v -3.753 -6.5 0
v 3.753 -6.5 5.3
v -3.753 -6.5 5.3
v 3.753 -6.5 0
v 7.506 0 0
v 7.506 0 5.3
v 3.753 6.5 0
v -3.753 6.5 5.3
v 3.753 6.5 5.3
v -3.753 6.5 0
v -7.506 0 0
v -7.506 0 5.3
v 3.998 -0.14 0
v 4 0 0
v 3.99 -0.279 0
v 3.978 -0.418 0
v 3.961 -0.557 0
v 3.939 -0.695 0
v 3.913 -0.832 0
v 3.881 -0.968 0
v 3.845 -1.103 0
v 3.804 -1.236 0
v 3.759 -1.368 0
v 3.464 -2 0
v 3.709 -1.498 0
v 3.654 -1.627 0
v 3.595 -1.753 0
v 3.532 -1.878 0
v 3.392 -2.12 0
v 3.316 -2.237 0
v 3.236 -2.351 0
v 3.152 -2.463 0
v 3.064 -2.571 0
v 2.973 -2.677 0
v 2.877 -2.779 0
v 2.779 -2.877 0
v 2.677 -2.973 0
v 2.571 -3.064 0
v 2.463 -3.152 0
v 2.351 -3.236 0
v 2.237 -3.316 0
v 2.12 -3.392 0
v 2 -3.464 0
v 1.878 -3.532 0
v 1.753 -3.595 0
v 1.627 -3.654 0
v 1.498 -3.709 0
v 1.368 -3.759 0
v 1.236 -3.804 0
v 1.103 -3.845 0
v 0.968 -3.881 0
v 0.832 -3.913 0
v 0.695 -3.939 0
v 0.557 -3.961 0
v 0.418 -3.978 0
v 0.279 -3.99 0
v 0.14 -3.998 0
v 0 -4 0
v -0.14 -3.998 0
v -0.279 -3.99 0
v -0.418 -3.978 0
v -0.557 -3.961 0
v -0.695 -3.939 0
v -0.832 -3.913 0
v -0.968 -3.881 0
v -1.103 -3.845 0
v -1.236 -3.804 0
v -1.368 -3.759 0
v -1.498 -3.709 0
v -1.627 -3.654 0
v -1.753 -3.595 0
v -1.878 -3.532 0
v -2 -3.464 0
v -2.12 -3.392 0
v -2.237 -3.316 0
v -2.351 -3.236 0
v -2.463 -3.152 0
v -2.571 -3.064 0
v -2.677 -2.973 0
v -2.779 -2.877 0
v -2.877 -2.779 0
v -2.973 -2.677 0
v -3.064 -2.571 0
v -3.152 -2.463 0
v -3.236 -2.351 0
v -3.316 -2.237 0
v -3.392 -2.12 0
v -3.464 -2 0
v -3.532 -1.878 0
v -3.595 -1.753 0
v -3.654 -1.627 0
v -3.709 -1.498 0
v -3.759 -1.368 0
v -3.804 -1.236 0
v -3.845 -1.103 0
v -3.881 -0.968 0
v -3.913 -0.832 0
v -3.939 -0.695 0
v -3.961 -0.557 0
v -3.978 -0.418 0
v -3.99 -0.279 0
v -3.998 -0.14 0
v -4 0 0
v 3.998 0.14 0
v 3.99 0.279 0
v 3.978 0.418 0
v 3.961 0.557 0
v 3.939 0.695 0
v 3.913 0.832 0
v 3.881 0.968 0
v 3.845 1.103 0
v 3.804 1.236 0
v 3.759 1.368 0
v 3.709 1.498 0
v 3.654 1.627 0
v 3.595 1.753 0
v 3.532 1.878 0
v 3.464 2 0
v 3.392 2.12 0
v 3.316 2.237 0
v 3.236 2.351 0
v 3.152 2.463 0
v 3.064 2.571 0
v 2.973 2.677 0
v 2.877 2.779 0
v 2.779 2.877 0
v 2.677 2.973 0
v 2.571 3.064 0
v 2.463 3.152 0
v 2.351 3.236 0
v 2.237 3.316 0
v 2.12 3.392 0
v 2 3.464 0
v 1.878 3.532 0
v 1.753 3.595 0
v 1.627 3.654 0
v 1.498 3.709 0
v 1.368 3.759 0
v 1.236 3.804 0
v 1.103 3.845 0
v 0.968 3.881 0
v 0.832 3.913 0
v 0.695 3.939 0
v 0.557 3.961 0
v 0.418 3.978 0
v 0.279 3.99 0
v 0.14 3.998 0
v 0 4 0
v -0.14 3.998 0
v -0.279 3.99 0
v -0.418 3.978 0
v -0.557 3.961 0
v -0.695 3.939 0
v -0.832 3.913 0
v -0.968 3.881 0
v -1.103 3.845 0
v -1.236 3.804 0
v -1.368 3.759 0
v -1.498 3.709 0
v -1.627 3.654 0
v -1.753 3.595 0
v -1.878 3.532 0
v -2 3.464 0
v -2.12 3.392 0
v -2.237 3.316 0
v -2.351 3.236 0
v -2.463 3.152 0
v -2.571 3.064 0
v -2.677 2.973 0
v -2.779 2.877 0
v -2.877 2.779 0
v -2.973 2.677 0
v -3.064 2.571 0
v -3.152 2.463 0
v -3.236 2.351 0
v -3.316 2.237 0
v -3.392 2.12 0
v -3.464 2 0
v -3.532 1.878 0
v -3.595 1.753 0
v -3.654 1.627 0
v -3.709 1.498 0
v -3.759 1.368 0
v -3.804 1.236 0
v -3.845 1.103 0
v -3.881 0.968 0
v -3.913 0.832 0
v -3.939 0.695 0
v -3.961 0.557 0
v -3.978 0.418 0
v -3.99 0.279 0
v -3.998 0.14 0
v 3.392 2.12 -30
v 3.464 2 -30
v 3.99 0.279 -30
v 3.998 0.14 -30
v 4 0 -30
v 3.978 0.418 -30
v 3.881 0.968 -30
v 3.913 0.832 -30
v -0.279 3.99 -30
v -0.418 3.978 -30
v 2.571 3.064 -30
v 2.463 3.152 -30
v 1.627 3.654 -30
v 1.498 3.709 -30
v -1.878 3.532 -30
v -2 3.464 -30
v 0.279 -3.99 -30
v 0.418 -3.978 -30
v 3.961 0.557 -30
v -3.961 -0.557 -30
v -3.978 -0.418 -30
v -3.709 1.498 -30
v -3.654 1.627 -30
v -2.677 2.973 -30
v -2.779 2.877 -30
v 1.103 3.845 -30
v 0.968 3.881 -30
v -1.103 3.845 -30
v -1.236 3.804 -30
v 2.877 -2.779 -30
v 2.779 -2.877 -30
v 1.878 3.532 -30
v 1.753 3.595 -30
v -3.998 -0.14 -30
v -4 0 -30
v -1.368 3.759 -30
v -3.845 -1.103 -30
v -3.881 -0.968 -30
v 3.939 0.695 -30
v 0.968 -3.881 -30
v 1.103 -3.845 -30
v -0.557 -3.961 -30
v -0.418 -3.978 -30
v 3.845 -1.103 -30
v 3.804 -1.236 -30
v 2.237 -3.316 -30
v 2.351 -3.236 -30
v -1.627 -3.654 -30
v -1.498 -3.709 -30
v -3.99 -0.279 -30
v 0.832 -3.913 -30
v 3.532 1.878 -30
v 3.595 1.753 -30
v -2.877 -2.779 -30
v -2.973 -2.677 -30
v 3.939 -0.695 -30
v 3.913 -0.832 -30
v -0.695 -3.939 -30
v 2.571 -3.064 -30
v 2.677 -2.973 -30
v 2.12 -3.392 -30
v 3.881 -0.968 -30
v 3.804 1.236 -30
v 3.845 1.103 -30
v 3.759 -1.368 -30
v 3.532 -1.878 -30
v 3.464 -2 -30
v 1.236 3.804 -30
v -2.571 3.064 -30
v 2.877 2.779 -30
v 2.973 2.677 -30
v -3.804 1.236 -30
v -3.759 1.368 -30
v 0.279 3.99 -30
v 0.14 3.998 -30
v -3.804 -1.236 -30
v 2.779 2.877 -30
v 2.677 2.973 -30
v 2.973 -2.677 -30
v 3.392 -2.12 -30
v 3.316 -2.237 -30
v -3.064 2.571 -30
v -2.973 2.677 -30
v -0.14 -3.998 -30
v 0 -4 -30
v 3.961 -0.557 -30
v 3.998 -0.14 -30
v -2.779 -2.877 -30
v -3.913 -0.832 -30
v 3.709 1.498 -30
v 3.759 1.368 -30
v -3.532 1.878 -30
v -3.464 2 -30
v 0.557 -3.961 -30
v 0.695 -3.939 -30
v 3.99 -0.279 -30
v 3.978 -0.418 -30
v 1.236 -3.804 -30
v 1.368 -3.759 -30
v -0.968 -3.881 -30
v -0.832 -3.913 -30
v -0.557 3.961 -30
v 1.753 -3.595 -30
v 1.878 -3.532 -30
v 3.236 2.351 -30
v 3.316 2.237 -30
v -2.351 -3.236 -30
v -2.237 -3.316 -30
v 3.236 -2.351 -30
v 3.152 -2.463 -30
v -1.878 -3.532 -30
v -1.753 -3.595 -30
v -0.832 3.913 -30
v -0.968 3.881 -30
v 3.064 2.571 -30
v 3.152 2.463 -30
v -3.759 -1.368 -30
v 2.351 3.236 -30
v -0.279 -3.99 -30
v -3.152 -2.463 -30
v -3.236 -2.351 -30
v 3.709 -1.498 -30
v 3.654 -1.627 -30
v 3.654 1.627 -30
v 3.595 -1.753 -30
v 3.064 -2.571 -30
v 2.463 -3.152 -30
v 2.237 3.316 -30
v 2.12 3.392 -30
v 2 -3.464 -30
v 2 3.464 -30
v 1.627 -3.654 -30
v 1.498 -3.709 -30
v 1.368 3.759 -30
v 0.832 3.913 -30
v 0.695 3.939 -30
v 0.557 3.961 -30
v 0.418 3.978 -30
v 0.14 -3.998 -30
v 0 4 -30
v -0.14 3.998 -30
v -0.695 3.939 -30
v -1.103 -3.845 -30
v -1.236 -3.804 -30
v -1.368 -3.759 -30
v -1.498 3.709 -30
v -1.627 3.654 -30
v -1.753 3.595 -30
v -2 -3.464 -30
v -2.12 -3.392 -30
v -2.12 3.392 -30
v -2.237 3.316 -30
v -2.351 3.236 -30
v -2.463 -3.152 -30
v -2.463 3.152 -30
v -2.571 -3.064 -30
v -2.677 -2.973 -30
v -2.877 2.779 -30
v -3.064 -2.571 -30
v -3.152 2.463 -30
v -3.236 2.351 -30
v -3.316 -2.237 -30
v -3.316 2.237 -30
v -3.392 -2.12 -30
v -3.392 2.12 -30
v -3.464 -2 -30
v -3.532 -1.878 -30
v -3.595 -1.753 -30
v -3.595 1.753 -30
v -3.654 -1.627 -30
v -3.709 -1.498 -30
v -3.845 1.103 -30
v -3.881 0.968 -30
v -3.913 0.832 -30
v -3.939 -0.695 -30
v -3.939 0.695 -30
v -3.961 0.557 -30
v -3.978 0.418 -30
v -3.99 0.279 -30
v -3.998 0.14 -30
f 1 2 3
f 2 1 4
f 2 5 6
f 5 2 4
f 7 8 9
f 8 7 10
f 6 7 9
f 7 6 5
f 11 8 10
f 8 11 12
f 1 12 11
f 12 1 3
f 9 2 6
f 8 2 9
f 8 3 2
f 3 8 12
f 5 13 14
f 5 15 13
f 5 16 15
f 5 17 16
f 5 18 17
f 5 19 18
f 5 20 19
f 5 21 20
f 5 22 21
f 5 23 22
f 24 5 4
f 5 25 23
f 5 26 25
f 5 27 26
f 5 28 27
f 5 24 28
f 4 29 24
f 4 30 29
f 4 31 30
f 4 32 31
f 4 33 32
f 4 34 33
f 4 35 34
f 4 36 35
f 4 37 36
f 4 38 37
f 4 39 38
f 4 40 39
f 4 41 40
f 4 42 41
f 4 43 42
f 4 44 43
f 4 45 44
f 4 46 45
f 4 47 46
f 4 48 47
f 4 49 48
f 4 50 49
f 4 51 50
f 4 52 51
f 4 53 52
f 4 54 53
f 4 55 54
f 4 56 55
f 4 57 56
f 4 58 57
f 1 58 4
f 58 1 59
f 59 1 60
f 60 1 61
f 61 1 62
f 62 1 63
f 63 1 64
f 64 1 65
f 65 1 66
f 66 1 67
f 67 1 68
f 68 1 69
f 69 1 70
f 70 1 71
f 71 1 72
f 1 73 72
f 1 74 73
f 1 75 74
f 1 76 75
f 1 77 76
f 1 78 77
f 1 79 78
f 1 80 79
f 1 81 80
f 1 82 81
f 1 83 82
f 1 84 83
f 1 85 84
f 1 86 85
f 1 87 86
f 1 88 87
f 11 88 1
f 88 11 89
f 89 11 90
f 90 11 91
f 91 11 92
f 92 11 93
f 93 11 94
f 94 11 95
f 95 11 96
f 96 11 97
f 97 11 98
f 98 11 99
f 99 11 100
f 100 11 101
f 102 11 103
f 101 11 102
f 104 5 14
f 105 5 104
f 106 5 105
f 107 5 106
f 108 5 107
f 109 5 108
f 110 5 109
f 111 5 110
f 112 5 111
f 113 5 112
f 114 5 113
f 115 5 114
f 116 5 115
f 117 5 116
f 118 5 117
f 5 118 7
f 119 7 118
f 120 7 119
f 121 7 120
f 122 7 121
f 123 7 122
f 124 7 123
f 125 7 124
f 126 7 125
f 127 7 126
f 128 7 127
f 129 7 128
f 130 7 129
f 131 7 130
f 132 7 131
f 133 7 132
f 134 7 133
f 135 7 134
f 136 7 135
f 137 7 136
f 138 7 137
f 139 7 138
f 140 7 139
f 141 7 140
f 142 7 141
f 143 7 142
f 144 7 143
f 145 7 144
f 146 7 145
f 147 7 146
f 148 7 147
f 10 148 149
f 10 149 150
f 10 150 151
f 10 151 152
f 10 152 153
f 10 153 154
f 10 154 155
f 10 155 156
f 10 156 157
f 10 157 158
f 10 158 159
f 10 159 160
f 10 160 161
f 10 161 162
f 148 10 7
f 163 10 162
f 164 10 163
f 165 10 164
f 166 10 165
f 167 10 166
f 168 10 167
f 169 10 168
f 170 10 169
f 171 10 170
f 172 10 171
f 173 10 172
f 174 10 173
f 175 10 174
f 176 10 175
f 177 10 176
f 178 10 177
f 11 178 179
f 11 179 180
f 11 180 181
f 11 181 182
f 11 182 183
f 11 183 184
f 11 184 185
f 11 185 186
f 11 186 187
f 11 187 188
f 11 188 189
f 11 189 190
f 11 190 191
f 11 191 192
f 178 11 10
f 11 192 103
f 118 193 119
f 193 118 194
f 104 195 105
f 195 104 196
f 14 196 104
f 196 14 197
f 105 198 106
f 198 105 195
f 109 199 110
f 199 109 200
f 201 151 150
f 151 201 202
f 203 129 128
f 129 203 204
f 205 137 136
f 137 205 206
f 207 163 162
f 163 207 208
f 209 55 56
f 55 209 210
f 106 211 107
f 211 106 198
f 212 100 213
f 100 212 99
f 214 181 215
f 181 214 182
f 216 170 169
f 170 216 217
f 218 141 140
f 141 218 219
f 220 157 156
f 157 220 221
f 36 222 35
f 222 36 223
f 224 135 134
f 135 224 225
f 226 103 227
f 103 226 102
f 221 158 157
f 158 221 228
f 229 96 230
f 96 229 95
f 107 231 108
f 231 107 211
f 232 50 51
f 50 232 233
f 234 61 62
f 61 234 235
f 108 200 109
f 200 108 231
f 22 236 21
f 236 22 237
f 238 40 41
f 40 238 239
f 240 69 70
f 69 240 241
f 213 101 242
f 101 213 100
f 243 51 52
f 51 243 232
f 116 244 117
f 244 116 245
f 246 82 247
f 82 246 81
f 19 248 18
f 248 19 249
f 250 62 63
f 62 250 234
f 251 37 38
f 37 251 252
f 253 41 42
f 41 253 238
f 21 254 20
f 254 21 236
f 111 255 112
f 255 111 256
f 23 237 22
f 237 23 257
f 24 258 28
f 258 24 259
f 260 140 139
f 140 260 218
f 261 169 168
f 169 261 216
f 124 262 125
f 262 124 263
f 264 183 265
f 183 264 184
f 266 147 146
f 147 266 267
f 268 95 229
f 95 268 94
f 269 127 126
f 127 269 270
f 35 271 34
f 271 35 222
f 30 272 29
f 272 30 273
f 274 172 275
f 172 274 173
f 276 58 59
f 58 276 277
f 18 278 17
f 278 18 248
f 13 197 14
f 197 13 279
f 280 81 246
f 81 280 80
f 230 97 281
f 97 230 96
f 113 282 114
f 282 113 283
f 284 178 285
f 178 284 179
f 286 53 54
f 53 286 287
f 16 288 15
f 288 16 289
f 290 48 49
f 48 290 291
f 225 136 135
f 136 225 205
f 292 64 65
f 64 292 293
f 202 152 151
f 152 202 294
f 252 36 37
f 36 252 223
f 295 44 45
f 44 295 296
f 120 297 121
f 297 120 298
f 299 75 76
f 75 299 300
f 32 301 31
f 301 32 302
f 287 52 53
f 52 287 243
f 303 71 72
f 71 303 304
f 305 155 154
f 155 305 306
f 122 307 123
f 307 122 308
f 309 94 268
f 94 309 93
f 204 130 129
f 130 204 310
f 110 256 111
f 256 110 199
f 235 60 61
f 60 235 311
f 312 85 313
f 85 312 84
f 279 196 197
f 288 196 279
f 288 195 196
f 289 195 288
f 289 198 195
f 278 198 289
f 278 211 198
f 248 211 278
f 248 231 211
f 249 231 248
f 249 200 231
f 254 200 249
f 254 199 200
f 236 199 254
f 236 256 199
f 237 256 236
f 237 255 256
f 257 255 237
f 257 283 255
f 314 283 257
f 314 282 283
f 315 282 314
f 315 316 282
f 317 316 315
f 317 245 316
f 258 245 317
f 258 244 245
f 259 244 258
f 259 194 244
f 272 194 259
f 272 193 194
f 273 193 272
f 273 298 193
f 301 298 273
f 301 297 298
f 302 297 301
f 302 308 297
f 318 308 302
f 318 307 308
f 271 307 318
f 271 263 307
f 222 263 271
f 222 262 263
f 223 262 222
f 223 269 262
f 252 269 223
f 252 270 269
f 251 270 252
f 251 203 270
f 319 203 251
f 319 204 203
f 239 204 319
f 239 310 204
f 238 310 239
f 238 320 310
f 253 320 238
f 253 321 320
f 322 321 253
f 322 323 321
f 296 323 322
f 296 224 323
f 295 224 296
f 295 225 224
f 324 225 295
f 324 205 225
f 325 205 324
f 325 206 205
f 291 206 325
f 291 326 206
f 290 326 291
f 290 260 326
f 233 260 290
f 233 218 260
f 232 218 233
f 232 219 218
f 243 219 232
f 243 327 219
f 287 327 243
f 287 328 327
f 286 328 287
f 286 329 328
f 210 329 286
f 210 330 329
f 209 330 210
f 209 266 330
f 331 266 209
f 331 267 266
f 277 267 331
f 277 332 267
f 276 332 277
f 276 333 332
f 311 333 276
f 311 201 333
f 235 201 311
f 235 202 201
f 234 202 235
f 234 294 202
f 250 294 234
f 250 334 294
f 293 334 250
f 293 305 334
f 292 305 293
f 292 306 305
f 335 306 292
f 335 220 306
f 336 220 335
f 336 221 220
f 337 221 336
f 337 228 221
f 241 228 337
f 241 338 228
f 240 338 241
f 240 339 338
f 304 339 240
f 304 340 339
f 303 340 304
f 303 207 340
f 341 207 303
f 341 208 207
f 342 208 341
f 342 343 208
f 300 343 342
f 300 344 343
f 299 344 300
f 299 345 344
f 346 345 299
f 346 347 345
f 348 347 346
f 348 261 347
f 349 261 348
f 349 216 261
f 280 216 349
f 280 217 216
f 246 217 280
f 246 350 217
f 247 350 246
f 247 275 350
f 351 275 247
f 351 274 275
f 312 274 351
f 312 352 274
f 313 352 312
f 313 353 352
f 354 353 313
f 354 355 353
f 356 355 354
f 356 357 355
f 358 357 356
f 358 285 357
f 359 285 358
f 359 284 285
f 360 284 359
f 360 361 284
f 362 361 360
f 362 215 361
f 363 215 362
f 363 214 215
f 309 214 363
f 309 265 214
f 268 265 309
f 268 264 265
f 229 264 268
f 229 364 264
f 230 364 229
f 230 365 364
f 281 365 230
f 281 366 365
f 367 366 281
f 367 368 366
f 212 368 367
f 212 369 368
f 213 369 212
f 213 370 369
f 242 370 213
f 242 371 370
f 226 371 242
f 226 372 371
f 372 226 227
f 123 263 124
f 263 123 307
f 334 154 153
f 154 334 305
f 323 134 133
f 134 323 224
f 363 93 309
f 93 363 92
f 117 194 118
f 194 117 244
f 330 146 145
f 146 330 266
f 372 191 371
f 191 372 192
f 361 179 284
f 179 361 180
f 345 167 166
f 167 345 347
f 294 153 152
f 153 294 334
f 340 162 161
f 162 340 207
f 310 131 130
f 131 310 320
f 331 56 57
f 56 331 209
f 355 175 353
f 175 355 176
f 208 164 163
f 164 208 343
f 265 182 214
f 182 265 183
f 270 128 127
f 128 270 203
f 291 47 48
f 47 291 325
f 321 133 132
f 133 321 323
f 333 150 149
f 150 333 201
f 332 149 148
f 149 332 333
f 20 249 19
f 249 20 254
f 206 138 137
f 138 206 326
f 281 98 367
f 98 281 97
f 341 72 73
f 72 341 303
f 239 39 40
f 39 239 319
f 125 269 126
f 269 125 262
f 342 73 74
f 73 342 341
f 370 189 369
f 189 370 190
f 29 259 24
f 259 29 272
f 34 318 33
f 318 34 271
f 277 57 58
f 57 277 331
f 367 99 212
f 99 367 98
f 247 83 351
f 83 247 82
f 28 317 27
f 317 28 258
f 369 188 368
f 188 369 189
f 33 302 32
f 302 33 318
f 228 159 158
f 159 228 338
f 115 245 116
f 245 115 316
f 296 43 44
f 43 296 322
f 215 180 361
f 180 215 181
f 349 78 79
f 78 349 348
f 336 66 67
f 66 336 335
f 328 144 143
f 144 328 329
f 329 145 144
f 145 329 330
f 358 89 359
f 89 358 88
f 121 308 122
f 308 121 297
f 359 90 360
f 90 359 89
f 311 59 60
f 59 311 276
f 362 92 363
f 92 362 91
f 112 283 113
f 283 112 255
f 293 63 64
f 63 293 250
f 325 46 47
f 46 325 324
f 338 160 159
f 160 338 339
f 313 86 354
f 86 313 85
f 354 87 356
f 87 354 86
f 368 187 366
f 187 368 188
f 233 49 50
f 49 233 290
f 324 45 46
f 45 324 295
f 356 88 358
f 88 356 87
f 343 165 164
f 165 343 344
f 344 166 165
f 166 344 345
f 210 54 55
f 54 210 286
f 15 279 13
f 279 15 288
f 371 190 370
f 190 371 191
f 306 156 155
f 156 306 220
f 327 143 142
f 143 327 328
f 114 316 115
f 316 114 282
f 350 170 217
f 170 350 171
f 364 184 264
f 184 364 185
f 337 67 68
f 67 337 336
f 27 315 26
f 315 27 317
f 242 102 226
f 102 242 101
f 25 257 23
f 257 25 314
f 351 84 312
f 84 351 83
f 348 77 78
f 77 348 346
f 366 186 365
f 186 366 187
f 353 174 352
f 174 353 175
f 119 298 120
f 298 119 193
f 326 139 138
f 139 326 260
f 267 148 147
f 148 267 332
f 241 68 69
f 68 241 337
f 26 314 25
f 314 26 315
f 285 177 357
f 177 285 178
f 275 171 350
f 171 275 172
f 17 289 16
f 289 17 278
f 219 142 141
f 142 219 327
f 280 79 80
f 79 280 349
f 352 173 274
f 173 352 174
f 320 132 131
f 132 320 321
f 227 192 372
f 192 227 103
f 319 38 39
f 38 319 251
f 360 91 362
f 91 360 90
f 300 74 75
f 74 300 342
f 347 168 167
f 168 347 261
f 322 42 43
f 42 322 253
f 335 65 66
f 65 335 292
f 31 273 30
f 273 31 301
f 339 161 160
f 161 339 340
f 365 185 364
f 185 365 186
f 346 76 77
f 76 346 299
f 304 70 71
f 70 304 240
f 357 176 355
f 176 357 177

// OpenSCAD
// M8 hex bolt (thread omitted)

$fn = 180;

// Parameters
af = 13;      // across-flats of hex head [mm]
h  = 5.3;     // head height [mm]
d  = 8;       // shank diameter [mm]
L  = 30;      // shank length [mm]

// Regular hexagon: across-flats = af, so circumradius R = af / sqrt(3)
module hex_prism(flat_to_flat, height) {
  r = flat_to_flat / sqrt(3);
  cylinder(h=height, r=r, center=false, $fn=6);
}

union() {
  // Head: bottom face at z=0
  hex_prism(af, h);

  // Shank: extend into z<0
  translate([0, 0, -L])
    cylinder(h=L, d=d, center=false, $fn=$fn);
}
